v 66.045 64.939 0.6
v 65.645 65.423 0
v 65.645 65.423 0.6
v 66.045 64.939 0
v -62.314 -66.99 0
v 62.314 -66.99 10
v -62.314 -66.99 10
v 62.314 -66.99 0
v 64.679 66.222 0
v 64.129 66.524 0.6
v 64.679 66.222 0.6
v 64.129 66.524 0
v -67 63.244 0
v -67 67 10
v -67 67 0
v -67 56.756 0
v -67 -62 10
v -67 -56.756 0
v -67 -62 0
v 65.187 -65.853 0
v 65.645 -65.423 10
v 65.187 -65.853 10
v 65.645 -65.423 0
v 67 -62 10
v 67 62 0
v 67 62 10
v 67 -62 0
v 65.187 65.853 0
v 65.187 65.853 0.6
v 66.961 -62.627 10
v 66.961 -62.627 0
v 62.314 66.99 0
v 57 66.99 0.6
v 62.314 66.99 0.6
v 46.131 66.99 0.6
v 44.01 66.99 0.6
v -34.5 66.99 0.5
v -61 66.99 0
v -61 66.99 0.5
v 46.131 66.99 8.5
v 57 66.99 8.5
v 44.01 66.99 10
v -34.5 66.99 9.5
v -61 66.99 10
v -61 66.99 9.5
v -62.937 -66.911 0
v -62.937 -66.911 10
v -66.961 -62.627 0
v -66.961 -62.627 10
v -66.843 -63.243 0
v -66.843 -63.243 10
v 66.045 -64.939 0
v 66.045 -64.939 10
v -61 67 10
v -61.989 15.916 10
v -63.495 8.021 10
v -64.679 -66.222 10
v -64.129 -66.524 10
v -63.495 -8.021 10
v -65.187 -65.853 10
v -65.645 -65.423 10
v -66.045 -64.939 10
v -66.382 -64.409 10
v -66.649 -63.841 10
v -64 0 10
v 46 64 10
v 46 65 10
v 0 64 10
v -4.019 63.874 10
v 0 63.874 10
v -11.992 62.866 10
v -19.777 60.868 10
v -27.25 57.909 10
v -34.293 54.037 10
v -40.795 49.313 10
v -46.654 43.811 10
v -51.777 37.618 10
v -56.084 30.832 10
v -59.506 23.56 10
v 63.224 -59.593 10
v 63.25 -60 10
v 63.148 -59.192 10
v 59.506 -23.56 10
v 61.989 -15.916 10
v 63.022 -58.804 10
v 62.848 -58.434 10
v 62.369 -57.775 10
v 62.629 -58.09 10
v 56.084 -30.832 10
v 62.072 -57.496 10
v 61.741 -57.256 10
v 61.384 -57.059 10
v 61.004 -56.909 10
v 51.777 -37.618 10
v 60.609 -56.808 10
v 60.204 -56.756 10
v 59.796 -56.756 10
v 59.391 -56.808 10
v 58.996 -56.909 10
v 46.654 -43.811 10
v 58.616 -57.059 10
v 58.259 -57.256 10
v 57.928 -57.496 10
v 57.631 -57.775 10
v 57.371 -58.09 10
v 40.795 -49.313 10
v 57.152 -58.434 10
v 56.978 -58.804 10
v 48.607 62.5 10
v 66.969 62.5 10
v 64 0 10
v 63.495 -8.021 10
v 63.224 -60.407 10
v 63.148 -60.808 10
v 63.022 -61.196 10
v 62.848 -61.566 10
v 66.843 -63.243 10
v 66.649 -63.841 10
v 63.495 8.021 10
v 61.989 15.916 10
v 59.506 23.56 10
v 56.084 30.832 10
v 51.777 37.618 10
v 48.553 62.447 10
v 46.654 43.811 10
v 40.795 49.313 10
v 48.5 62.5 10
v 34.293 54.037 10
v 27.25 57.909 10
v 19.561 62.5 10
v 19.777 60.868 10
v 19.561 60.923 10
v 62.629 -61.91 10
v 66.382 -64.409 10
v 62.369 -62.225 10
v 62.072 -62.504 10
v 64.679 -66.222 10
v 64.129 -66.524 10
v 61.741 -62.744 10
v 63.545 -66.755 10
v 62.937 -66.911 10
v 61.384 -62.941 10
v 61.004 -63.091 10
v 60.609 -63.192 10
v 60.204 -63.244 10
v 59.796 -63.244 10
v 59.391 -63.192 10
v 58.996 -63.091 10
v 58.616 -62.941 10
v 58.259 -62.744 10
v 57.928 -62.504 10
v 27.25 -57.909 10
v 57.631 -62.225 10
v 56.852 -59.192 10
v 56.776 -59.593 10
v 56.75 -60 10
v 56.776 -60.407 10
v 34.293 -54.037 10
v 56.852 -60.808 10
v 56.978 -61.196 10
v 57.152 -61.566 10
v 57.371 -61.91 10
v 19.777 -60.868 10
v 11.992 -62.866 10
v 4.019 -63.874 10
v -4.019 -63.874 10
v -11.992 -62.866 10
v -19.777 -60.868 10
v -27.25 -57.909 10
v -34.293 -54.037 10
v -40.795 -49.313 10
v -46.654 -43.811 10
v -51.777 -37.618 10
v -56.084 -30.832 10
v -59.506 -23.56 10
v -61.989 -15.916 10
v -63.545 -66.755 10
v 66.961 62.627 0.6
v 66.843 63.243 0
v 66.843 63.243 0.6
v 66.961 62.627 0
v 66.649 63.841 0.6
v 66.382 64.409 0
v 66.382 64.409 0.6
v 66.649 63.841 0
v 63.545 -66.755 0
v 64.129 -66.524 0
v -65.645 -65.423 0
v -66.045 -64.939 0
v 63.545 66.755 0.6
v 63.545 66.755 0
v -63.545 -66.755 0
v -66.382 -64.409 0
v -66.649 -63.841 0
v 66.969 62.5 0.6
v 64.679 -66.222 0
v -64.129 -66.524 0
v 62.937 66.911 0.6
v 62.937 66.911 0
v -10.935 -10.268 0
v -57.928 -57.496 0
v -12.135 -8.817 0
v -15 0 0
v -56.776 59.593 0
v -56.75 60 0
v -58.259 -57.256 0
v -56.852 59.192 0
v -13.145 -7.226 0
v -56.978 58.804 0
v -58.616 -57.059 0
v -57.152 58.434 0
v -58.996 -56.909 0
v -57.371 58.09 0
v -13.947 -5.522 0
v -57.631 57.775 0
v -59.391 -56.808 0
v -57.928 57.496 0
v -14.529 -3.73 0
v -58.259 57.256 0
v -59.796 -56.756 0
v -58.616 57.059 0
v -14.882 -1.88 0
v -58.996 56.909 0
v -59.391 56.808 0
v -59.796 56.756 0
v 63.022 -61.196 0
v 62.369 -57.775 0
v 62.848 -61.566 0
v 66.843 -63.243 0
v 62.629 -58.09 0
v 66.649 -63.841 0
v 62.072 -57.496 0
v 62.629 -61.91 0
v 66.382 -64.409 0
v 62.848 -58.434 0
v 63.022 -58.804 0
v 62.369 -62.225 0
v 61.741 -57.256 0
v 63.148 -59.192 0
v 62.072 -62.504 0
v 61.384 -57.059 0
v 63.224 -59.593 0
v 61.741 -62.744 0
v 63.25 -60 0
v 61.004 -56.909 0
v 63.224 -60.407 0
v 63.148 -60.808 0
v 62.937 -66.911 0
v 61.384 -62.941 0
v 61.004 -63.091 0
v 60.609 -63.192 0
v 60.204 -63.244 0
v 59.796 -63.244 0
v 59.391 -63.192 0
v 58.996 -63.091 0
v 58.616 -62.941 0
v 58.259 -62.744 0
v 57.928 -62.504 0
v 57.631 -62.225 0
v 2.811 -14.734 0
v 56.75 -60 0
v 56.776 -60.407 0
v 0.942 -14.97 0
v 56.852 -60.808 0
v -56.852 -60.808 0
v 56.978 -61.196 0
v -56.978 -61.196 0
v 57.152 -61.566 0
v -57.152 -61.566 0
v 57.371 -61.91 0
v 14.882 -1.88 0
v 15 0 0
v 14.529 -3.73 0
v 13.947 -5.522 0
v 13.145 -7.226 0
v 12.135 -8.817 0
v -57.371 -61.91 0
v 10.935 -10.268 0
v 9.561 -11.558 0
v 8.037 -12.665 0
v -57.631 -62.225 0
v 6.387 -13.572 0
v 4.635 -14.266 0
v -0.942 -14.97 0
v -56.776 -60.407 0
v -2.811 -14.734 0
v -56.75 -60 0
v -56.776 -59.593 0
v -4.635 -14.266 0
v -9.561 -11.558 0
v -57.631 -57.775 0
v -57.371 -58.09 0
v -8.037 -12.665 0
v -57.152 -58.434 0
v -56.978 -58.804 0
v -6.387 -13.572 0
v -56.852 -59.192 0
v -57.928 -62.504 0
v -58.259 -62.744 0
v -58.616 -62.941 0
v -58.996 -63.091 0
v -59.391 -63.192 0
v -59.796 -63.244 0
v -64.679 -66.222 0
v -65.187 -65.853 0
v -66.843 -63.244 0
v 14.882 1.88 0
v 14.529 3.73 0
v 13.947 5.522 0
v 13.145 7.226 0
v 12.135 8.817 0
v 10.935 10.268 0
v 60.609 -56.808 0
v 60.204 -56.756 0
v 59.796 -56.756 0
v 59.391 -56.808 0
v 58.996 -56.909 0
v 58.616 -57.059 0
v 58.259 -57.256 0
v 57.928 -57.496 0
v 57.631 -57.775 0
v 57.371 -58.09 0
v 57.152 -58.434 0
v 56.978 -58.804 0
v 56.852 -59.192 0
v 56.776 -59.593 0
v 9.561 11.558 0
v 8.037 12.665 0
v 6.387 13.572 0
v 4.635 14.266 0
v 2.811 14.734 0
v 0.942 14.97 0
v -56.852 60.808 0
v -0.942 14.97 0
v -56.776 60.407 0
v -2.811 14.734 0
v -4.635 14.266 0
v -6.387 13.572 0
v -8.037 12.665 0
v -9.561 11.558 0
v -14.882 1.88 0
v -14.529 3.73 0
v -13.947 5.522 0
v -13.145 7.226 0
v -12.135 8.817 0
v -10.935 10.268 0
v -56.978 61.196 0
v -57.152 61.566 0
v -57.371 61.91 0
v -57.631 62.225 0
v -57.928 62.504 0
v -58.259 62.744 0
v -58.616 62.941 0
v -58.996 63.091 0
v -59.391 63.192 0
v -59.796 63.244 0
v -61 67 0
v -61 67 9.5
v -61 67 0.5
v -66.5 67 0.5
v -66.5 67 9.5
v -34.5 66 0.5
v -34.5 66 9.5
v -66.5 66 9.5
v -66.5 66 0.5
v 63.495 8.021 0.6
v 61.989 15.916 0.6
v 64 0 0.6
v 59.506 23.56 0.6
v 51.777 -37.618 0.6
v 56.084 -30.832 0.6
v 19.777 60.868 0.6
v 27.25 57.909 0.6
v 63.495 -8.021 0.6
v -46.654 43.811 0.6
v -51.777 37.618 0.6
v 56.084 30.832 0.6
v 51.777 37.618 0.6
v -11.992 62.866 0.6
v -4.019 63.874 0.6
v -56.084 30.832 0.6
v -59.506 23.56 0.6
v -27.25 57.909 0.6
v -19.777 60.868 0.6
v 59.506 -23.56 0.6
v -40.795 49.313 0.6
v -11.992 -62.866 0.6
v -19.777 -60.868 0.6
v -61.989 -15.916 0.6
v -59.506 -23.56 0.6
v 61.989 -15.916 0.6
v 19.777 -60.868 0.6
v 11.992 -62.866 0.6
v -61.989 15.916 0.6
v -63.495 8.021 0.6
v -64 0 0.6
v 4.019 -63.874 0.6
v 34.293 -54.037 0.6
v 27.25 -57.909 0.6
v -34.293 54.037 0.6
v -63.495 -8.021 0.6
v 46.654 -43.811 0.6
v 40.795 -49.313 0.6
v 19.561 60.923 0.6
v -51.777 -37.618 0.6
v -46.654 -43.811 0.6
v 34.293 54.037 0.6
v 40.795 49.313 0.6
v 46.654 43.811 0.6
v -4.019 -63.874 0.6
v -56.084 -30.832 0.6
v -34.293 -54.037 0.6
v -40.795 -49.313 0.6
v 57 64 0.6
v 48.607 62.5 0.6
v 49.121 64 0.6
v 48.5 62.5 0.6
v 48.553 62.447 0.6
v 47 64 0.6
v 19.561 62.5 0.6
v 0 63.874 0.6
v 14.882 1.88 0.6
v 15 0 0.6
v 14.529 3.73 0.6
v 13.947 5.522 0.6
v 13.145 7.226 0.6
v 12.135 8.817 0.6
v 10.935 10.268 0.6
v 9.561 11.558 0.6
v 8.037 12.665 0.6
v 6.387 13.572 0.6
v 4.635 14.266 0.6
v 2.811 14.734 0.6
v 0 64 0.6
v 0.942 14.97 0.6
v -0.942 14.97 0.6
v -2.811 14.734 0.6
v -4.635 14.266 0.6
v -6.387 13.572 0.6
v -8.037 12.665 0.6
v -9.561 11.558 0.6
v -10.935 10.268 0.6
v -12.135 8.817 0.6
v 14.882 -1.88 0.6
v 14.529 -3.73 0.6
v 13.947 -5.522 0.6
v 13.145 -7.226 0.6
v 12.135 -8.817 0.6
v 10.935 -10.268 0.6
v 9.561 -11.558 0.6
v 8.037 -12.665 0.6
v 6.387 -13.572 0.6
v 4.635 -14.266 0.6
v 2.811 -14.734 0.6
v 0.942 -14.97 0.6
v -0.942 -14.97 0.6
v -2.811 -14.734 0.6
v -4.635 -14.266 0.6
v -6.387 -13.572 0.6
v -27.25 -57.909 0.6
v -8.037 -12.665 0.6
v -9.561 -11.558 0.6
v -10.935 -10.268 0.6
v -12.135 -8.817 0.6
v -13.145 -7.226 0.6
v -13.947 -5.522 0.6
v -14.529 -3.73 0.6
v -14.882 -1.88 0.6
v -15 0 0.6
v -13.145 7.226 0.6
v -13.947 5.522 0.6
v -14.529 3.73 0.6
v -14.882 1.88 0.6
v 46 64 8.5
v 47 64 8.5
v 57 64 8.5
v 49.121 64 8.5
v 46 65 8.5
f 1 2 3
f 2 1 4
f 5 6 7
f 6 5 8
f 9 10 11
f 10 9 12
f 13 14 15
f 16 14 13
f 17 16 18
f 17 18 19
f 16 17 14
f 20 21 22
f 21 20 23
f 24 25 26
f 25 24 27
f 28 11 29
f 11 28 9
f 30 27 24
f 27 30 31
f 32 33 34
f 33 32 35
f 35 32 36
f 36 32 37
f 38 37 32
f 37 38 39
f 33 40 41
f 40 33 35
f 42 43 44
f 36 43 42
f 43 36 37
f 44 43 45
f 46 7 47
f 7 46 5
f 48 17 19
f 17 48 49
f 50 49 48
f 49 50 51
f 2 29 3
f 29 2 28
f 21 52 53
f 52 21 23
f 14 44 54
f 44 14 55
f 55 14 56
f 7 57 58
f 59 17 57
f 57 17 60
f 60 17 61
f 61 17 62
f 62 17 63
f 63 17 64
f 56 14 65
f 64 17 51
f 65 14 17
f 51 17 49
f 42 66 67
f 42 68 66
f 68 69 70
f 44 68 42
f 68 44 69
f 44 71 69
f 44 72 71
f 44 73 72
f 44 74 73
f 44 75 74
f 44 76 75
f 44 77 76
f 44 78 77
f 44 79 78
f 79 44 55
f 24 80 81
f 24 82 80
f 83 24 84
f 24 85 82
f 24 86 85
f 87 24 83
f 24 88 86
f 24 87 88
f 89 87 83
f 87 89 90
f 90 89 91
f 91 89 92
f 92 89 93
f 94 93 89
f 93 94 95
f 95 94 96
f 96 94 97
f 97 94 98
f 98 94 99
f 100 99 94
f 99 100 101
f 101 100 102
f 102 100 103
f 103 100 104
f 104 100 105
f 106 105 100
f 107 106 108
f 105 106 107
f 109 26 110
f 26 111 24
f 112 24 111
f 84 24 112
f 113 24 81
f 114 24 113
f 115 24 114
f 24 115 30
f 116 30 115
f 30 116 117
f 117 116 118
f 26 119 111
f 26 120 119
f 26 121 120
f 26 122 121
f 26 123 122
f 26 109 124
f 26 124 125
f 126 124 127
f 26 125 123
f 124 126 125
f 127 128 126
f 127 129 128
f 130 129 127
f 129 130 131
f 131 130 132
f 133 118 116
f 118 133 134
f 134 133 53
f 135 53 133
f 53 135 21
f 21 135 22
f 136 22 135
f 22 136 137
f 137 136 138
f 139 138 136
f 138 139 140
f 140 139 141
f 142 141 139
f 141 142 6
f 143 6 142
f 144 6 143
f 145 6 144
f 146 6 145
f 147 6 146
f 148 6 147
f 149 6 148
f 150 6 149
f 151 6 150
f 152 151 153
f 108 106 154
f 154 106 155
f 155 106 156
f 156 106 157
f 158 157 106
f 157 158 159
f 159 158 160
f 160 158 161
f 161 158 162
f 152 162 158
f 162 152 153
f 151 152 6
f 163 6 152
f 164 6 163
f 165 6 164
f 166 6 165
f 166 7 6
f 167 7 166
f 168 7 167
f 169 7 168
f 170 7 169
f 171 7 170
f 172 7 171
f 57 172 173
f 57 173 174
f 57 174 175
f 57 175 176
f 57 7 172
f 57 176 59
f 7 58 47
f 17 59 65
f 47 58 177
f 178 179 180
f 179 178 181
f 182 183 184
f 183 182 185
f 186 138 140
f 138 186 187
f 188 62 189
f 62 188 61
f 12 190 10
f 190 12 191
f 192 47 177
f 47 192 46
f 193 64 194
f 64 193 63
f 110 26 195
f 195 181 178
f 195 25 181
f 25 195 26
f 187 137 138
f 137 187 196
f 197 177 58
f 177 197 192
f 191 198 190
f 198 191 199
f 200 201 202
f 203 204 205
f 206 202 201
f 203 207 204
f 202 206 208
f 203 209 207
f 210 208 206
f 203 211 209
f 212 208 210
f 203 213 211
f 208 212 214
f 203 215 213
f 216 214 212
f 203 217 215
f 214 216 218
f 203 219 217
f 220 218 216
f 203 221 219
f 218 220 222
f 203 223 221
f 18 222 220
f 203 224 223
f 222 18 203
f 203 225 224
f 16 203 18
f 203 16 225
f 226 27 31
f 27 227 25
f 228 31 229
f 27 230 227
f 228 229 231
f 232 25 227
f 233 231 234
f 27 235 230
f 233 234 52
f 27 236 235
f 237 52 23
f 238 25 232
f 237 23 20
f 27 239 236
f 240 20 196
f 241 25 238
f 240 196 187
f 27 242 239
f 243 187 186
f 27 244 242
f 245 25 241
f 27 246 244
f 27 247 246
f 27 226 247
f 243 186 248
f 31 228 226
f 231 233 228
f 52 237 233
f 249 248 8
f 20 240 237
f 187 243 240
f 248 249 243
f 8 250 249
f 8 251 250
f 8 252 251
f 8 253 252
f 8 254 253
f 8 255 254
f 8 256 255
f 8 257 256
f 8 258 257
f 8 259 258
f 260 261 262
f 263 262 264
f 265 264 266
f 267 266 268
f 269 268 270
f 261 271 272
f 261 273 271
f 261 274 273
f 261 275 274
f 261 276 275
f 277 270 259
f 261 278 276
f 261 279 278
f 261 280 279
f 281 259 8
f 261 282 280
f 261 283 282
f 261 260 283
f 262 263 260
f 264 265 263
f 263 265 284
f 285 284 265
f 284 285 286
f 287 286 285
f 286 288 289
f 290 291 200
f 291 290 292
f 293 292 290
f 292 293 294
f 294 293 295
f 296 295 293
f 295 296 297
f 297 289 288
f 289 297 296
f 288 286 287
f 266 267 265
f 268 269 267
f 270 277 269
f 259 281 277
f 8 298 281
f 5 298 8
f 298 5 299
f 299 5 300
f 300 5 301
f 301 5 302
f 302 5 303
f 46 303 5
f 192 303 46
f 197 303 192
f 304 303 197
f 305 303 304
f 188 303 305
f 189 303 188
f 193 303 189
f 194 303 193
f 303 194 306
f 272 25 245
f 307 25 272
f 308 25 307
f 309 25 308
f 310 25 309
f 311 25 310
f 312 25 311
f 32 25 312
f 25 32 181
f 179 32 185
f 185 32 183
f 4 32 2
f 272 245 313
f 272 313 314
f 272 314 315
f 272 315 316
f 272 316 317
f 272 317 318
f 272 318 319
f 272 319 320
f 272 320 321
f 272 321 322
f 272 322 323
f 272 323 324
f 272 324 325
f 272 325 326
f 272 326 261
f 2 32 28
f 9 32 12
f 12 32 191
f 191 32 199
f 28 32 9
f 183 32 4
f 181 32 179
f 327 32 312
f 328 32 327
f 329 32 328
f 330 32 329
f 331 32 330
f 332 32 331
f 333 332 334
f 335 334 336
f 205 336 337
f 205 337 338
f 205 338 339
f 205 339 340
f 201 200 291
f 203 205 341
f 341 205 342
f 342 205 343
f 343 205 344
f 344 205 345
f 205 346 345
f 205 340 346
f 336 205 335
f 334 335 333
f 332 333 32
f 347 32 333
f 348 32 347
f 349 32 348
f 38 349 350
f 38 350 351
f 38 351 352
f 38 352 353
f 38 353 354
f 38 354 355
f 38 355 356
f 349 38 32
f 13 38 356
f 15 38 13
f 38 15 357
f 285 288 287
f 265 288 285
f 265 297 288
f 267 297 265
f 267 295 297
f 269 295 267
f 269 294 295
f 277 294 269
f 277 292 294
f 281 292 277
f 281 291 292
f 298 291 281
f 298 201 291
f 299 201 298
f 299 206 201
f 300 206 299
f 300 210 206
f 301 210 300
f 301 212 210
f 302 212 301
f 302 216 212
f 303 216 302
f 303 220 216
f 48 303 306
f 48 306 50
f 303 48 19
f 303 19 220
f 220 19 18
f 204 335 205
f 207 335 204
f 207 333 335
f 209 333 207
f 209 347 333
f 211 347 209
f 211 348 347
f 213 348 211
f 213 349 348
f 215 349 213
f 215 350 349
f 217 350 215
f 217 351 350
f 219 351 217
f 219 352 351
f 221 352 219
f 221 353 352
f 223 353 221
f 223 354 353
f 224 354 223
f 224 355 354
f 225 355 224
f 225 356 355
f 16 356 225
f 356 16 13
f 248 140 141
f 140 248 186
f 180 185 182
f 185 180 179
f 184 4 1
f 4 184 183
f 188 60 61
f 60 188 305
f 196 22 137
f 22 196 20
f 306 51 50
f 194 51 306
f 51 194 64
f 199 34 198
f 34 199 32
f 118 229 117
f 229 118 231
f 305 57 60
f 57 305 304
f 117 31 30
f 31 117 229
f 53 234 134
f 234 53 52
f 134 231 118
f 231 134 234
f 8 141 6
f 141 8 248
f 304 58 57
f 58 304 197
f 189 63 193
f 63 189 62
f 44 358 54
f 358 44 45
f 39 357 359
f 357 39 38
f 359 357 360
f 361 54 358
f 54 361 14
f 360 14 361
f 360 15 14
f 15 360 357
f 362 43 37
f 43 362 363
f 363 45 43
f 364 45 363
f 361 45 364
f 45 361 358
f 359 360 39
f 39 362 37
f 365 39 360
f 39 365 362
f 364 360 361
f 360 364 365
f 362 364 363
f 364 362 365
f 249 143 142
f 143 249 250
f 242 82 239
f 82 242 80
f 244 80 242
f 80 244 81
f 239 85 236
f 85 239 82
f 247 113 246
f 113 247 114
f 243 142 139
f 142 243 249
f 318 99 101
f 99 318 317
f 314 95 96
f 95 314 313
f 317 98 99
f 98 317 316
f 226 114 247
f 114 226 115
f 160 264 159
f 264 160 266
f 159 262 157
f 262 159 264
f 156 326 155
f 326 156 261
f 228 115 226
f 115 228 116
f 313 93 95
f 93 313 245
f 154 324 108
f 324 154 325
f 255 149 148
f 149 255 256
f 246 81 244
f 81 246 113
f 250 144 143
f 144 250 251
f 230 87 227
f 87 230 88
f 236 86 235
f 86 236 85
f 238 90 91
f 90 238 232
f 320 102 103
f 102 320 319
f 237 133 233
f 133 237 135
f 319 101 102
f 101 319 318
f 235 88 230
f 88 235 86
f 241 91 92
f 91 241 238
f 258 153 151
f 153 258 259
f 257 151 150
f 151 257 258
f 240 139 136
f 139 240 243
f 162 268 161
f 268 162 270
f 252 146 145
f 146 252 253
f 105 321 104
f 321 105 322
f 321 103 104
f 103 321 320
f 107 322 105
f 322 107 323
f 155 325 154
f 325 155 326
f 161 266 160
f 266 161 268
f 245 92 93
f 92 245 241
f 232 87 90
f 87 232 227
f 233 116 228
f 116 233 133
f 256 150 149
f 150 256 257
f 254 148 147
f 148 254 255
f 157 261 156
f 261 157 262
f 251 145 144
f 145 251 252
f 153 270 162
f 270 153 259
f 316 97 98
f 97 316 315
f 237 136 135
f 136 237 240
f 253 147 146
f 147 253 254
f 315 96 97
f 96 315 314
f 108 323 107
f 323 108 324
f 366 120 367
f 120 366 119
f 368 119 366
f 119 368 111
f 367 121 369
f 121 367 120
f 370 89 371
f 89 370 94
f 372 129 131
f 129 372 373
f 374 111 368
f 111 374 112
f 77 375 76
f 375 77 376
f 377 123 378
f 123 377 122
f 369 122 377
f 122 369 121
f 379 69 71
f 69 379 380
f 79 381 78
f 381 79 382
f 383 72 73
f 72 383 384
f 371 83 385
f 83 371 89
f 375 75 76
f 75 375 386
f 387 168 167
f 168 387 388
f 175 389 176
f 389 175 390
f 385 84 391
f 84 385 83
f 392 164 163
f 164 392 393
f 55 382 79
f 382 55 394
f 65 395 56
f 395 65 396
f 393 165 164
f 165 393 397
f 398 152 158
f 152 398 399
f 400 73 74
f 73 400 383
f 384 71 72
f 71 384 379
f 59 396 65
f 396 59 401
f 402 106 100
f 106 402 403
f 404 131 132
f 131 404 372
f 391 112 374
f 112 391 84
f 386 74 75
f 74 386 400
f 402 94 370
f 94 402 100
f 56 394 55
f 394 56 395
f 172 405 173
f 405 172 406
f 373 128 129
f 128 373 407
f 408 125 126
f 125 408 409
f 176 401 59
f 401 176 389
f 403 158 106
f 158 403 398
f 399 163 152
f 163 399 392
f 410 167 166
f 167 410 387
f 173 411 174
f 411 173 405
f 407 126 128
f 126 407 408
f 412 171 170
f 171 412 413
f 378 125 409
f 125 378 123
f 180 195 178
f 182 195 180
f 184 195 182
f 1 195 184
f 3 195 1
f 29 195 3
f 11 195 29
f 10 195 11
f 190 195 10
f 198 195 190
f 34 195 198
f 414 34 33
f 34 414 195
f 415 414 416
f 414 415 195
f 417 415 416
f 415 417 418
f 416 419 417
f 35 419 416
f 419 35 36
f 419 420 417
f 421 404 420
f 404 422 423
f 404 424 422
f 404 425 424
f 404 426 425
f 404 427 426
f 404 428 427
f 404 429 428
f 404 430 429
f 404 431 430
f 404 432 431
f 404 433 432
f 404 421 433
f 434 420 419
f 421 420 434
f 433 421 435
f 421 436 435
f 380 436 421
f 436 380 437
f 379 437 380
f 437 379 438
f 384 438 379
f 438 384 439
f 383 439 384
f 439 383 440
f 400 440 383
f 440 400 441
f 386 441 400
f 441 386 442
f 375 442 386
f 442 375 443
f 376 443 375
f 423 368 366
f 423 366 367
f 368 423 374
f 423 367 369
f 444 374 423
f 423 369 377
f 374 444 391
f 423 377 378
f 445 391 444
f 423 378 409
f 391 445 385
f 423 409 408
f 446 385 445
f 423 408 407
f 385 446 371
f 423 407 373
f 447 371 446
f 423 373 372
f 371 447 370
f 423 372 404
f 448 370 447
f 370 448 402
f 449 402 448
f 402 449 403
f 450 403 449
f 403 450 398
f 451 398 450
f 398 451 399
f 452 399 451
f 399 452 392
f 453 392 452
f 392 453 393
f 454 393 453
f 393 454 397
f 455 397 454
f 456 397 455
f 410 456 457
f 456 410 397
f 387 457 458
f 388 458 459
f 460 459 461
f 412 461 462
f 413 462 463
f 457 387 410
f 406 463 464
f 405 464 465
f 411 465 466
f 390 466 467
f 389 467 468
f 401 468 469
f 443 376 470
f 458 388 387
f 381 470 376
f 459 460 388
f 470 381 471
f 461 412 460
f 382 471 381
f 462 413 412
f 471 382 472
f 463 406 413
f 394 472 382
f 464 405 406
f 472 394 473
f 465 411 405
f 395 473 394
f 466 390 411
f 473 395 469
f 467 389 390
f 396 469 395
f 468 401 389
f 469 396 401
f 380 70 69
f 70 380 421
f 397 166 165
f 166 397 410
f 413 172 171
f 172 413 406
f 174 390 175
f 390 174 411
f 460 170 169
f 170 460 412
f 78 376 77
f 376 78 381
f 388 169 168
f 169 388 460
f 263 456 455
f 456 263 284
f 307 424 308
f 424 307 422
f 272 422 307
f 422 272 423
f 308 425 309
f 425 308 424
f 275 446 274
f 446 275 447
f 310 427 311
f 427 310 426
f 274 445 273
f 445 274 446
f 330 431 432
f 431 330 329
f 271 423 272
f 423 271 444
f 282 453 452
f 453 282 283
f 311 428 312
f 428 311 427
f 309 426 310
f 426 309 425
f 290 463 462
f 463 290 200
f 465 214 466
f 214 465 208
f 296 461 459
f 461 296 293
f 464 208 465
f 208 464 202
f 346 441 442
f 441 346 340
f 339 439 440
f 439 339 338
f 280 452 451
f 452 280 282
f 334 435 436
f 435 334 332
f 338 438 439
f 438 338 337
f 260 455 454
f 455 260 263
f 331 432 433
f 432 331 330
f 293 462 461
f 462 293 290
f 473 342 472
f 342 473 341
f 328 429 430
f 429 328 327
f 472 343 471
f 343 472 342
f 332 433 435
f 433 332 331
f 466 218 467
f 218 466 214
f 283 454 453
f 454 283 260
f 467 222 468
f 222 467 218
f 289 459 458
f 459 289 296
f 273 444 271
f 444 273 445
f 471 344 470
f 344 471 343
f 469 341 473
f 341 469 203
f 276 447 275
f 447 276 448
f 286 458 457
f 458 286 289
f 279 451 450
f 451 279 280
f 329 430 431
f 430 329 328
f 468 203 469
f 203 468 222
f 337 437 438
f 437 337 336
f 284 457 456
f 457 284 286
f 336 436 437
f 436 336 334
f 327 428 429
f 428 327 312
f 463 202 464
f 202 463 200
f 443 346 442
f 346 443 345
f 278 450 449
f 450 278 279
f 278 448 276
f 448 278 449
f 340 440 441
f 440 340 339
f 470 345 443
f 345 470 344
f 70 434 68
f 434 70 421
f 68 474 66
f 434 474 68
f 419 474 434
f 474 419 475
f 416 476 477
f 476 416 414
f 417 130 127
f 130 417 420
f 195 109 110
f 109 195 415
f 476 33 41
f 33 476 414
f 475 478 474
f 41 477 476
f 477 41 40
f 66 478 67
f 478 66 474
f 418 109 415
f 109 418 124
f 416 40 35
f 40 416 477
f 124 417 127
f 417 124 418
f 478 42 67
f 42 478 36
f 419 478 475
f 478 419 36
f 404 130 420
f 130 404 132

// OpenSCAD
$fn = 50;


difference() {
	union() {
		hull() {
			translate(v = [-62.0000000000, 62.0000000000, 0]) {
				cylinder(h = 10, r = 5);
			}
			translate(v = [62.0000000000, 62.0000000000, 0]) {
				cylinder(h = 10, r = 5);
			}
			translate(v = [-62.0000000000, -62.0000000000, 0]) {
				cylinder(h = 10, r = 5);
			}
			translate(v = [62.0000000000, -62.0000000000, 0]) {
				cylinder(h = 10, r = 5);
			}
		}
		translate(v = [-67.0000000000, 61.0000000000, 0]) {
			cube(size = [6, 6, 10]);
		}
	}
	union() {
		translate(v = [-67.5000000000, -60.0000000000, -250.0000000000]) {
			rotate(a = [0, 0, 0]) {
				difference() {
					union() {
						hull() {
							translate(v = [7.5000000000, 0, 0]) {
								cylinder(h = 250, r = 3.2500000000, r1 = 3.2500000000, r2 = 3.2500000000);
							}
							translate(v = [-7.5000000000, 0, 0]) {
								cylinder(h = 250, r = 3.2500000000, r1 = 3.2500000000, r2 = 3.2500000000);
							}
						}
					}
					union();
				}
			}
		}
		translate(v = [-67.5000000000, 60.0000000000, -250.0000000000]) {
			rotate(a = [0, 0, 0]) {
				difference() {
					union() {
						hull() {
							translate(v = [7.5000000000, 0, 0]) {
								cylinder(h = 250, r = 3.2500000000, r1 = 3.2500000000, r2 = 3.2500000000);
							}
							translate(v = [-7.5000000000, 0, 0]) {
								cylinder(h = 250, r = 3.2500000000, r1 = 3.2500000000, r2 = 3.2500000000);
							}
						}
					}
					union();
				}
			}
		}
		translate(v = [-66.5000000000, 66.0000000000, 0.5000000000]) {
			cube(size = [32, 1, 9.0000000000]);
		}
		translate(v = [60.0000000000, -60.0000000000, -50.0000000000]) {
			cylinder(h = 100, r = 3.2500000000);
		}
		translate(v = [0, 0, 0.6000000000]) {
			cylinder(h = 12.4000000000, r = 64.0000000000);
		}
		translate(v = [0, 0, -5.0000000000]) {
			cylinder(h = 10, r = 15.0000000000);
		}
		translate(v = [0.0000000000, 62.5000000000, 0.6000000000]) {
			cube(size = [67.0000000000, 1.5000000000, 12.4000000000]);
		}
		translate(v = [57.0000000000, 62.5000000000, 0.6000000000]) {
			cube(size = [10, 4.5000000000, 12.4000000000]);
		}
		translate(v = [46.0000000000, 62.5000000000, 8.5000000000]) {
			cube(size = [21, 4.5000000000, 1.5000000000]);
		}
		translate(v = [43.2500000000, 67.7500000000, 0.6000000000]) {
			rotate(a = [0, 0, -45]) {
				cube(size = [7.5000000000, 1.5000000000, 12.4000000000]);
			}
		}
		translate(v = [12.0610000000, 60.5000000000, 0.6000000000]) {
			cube(size = [7.5000000000, 2, 9.4000000000]);
		}
	}
}
